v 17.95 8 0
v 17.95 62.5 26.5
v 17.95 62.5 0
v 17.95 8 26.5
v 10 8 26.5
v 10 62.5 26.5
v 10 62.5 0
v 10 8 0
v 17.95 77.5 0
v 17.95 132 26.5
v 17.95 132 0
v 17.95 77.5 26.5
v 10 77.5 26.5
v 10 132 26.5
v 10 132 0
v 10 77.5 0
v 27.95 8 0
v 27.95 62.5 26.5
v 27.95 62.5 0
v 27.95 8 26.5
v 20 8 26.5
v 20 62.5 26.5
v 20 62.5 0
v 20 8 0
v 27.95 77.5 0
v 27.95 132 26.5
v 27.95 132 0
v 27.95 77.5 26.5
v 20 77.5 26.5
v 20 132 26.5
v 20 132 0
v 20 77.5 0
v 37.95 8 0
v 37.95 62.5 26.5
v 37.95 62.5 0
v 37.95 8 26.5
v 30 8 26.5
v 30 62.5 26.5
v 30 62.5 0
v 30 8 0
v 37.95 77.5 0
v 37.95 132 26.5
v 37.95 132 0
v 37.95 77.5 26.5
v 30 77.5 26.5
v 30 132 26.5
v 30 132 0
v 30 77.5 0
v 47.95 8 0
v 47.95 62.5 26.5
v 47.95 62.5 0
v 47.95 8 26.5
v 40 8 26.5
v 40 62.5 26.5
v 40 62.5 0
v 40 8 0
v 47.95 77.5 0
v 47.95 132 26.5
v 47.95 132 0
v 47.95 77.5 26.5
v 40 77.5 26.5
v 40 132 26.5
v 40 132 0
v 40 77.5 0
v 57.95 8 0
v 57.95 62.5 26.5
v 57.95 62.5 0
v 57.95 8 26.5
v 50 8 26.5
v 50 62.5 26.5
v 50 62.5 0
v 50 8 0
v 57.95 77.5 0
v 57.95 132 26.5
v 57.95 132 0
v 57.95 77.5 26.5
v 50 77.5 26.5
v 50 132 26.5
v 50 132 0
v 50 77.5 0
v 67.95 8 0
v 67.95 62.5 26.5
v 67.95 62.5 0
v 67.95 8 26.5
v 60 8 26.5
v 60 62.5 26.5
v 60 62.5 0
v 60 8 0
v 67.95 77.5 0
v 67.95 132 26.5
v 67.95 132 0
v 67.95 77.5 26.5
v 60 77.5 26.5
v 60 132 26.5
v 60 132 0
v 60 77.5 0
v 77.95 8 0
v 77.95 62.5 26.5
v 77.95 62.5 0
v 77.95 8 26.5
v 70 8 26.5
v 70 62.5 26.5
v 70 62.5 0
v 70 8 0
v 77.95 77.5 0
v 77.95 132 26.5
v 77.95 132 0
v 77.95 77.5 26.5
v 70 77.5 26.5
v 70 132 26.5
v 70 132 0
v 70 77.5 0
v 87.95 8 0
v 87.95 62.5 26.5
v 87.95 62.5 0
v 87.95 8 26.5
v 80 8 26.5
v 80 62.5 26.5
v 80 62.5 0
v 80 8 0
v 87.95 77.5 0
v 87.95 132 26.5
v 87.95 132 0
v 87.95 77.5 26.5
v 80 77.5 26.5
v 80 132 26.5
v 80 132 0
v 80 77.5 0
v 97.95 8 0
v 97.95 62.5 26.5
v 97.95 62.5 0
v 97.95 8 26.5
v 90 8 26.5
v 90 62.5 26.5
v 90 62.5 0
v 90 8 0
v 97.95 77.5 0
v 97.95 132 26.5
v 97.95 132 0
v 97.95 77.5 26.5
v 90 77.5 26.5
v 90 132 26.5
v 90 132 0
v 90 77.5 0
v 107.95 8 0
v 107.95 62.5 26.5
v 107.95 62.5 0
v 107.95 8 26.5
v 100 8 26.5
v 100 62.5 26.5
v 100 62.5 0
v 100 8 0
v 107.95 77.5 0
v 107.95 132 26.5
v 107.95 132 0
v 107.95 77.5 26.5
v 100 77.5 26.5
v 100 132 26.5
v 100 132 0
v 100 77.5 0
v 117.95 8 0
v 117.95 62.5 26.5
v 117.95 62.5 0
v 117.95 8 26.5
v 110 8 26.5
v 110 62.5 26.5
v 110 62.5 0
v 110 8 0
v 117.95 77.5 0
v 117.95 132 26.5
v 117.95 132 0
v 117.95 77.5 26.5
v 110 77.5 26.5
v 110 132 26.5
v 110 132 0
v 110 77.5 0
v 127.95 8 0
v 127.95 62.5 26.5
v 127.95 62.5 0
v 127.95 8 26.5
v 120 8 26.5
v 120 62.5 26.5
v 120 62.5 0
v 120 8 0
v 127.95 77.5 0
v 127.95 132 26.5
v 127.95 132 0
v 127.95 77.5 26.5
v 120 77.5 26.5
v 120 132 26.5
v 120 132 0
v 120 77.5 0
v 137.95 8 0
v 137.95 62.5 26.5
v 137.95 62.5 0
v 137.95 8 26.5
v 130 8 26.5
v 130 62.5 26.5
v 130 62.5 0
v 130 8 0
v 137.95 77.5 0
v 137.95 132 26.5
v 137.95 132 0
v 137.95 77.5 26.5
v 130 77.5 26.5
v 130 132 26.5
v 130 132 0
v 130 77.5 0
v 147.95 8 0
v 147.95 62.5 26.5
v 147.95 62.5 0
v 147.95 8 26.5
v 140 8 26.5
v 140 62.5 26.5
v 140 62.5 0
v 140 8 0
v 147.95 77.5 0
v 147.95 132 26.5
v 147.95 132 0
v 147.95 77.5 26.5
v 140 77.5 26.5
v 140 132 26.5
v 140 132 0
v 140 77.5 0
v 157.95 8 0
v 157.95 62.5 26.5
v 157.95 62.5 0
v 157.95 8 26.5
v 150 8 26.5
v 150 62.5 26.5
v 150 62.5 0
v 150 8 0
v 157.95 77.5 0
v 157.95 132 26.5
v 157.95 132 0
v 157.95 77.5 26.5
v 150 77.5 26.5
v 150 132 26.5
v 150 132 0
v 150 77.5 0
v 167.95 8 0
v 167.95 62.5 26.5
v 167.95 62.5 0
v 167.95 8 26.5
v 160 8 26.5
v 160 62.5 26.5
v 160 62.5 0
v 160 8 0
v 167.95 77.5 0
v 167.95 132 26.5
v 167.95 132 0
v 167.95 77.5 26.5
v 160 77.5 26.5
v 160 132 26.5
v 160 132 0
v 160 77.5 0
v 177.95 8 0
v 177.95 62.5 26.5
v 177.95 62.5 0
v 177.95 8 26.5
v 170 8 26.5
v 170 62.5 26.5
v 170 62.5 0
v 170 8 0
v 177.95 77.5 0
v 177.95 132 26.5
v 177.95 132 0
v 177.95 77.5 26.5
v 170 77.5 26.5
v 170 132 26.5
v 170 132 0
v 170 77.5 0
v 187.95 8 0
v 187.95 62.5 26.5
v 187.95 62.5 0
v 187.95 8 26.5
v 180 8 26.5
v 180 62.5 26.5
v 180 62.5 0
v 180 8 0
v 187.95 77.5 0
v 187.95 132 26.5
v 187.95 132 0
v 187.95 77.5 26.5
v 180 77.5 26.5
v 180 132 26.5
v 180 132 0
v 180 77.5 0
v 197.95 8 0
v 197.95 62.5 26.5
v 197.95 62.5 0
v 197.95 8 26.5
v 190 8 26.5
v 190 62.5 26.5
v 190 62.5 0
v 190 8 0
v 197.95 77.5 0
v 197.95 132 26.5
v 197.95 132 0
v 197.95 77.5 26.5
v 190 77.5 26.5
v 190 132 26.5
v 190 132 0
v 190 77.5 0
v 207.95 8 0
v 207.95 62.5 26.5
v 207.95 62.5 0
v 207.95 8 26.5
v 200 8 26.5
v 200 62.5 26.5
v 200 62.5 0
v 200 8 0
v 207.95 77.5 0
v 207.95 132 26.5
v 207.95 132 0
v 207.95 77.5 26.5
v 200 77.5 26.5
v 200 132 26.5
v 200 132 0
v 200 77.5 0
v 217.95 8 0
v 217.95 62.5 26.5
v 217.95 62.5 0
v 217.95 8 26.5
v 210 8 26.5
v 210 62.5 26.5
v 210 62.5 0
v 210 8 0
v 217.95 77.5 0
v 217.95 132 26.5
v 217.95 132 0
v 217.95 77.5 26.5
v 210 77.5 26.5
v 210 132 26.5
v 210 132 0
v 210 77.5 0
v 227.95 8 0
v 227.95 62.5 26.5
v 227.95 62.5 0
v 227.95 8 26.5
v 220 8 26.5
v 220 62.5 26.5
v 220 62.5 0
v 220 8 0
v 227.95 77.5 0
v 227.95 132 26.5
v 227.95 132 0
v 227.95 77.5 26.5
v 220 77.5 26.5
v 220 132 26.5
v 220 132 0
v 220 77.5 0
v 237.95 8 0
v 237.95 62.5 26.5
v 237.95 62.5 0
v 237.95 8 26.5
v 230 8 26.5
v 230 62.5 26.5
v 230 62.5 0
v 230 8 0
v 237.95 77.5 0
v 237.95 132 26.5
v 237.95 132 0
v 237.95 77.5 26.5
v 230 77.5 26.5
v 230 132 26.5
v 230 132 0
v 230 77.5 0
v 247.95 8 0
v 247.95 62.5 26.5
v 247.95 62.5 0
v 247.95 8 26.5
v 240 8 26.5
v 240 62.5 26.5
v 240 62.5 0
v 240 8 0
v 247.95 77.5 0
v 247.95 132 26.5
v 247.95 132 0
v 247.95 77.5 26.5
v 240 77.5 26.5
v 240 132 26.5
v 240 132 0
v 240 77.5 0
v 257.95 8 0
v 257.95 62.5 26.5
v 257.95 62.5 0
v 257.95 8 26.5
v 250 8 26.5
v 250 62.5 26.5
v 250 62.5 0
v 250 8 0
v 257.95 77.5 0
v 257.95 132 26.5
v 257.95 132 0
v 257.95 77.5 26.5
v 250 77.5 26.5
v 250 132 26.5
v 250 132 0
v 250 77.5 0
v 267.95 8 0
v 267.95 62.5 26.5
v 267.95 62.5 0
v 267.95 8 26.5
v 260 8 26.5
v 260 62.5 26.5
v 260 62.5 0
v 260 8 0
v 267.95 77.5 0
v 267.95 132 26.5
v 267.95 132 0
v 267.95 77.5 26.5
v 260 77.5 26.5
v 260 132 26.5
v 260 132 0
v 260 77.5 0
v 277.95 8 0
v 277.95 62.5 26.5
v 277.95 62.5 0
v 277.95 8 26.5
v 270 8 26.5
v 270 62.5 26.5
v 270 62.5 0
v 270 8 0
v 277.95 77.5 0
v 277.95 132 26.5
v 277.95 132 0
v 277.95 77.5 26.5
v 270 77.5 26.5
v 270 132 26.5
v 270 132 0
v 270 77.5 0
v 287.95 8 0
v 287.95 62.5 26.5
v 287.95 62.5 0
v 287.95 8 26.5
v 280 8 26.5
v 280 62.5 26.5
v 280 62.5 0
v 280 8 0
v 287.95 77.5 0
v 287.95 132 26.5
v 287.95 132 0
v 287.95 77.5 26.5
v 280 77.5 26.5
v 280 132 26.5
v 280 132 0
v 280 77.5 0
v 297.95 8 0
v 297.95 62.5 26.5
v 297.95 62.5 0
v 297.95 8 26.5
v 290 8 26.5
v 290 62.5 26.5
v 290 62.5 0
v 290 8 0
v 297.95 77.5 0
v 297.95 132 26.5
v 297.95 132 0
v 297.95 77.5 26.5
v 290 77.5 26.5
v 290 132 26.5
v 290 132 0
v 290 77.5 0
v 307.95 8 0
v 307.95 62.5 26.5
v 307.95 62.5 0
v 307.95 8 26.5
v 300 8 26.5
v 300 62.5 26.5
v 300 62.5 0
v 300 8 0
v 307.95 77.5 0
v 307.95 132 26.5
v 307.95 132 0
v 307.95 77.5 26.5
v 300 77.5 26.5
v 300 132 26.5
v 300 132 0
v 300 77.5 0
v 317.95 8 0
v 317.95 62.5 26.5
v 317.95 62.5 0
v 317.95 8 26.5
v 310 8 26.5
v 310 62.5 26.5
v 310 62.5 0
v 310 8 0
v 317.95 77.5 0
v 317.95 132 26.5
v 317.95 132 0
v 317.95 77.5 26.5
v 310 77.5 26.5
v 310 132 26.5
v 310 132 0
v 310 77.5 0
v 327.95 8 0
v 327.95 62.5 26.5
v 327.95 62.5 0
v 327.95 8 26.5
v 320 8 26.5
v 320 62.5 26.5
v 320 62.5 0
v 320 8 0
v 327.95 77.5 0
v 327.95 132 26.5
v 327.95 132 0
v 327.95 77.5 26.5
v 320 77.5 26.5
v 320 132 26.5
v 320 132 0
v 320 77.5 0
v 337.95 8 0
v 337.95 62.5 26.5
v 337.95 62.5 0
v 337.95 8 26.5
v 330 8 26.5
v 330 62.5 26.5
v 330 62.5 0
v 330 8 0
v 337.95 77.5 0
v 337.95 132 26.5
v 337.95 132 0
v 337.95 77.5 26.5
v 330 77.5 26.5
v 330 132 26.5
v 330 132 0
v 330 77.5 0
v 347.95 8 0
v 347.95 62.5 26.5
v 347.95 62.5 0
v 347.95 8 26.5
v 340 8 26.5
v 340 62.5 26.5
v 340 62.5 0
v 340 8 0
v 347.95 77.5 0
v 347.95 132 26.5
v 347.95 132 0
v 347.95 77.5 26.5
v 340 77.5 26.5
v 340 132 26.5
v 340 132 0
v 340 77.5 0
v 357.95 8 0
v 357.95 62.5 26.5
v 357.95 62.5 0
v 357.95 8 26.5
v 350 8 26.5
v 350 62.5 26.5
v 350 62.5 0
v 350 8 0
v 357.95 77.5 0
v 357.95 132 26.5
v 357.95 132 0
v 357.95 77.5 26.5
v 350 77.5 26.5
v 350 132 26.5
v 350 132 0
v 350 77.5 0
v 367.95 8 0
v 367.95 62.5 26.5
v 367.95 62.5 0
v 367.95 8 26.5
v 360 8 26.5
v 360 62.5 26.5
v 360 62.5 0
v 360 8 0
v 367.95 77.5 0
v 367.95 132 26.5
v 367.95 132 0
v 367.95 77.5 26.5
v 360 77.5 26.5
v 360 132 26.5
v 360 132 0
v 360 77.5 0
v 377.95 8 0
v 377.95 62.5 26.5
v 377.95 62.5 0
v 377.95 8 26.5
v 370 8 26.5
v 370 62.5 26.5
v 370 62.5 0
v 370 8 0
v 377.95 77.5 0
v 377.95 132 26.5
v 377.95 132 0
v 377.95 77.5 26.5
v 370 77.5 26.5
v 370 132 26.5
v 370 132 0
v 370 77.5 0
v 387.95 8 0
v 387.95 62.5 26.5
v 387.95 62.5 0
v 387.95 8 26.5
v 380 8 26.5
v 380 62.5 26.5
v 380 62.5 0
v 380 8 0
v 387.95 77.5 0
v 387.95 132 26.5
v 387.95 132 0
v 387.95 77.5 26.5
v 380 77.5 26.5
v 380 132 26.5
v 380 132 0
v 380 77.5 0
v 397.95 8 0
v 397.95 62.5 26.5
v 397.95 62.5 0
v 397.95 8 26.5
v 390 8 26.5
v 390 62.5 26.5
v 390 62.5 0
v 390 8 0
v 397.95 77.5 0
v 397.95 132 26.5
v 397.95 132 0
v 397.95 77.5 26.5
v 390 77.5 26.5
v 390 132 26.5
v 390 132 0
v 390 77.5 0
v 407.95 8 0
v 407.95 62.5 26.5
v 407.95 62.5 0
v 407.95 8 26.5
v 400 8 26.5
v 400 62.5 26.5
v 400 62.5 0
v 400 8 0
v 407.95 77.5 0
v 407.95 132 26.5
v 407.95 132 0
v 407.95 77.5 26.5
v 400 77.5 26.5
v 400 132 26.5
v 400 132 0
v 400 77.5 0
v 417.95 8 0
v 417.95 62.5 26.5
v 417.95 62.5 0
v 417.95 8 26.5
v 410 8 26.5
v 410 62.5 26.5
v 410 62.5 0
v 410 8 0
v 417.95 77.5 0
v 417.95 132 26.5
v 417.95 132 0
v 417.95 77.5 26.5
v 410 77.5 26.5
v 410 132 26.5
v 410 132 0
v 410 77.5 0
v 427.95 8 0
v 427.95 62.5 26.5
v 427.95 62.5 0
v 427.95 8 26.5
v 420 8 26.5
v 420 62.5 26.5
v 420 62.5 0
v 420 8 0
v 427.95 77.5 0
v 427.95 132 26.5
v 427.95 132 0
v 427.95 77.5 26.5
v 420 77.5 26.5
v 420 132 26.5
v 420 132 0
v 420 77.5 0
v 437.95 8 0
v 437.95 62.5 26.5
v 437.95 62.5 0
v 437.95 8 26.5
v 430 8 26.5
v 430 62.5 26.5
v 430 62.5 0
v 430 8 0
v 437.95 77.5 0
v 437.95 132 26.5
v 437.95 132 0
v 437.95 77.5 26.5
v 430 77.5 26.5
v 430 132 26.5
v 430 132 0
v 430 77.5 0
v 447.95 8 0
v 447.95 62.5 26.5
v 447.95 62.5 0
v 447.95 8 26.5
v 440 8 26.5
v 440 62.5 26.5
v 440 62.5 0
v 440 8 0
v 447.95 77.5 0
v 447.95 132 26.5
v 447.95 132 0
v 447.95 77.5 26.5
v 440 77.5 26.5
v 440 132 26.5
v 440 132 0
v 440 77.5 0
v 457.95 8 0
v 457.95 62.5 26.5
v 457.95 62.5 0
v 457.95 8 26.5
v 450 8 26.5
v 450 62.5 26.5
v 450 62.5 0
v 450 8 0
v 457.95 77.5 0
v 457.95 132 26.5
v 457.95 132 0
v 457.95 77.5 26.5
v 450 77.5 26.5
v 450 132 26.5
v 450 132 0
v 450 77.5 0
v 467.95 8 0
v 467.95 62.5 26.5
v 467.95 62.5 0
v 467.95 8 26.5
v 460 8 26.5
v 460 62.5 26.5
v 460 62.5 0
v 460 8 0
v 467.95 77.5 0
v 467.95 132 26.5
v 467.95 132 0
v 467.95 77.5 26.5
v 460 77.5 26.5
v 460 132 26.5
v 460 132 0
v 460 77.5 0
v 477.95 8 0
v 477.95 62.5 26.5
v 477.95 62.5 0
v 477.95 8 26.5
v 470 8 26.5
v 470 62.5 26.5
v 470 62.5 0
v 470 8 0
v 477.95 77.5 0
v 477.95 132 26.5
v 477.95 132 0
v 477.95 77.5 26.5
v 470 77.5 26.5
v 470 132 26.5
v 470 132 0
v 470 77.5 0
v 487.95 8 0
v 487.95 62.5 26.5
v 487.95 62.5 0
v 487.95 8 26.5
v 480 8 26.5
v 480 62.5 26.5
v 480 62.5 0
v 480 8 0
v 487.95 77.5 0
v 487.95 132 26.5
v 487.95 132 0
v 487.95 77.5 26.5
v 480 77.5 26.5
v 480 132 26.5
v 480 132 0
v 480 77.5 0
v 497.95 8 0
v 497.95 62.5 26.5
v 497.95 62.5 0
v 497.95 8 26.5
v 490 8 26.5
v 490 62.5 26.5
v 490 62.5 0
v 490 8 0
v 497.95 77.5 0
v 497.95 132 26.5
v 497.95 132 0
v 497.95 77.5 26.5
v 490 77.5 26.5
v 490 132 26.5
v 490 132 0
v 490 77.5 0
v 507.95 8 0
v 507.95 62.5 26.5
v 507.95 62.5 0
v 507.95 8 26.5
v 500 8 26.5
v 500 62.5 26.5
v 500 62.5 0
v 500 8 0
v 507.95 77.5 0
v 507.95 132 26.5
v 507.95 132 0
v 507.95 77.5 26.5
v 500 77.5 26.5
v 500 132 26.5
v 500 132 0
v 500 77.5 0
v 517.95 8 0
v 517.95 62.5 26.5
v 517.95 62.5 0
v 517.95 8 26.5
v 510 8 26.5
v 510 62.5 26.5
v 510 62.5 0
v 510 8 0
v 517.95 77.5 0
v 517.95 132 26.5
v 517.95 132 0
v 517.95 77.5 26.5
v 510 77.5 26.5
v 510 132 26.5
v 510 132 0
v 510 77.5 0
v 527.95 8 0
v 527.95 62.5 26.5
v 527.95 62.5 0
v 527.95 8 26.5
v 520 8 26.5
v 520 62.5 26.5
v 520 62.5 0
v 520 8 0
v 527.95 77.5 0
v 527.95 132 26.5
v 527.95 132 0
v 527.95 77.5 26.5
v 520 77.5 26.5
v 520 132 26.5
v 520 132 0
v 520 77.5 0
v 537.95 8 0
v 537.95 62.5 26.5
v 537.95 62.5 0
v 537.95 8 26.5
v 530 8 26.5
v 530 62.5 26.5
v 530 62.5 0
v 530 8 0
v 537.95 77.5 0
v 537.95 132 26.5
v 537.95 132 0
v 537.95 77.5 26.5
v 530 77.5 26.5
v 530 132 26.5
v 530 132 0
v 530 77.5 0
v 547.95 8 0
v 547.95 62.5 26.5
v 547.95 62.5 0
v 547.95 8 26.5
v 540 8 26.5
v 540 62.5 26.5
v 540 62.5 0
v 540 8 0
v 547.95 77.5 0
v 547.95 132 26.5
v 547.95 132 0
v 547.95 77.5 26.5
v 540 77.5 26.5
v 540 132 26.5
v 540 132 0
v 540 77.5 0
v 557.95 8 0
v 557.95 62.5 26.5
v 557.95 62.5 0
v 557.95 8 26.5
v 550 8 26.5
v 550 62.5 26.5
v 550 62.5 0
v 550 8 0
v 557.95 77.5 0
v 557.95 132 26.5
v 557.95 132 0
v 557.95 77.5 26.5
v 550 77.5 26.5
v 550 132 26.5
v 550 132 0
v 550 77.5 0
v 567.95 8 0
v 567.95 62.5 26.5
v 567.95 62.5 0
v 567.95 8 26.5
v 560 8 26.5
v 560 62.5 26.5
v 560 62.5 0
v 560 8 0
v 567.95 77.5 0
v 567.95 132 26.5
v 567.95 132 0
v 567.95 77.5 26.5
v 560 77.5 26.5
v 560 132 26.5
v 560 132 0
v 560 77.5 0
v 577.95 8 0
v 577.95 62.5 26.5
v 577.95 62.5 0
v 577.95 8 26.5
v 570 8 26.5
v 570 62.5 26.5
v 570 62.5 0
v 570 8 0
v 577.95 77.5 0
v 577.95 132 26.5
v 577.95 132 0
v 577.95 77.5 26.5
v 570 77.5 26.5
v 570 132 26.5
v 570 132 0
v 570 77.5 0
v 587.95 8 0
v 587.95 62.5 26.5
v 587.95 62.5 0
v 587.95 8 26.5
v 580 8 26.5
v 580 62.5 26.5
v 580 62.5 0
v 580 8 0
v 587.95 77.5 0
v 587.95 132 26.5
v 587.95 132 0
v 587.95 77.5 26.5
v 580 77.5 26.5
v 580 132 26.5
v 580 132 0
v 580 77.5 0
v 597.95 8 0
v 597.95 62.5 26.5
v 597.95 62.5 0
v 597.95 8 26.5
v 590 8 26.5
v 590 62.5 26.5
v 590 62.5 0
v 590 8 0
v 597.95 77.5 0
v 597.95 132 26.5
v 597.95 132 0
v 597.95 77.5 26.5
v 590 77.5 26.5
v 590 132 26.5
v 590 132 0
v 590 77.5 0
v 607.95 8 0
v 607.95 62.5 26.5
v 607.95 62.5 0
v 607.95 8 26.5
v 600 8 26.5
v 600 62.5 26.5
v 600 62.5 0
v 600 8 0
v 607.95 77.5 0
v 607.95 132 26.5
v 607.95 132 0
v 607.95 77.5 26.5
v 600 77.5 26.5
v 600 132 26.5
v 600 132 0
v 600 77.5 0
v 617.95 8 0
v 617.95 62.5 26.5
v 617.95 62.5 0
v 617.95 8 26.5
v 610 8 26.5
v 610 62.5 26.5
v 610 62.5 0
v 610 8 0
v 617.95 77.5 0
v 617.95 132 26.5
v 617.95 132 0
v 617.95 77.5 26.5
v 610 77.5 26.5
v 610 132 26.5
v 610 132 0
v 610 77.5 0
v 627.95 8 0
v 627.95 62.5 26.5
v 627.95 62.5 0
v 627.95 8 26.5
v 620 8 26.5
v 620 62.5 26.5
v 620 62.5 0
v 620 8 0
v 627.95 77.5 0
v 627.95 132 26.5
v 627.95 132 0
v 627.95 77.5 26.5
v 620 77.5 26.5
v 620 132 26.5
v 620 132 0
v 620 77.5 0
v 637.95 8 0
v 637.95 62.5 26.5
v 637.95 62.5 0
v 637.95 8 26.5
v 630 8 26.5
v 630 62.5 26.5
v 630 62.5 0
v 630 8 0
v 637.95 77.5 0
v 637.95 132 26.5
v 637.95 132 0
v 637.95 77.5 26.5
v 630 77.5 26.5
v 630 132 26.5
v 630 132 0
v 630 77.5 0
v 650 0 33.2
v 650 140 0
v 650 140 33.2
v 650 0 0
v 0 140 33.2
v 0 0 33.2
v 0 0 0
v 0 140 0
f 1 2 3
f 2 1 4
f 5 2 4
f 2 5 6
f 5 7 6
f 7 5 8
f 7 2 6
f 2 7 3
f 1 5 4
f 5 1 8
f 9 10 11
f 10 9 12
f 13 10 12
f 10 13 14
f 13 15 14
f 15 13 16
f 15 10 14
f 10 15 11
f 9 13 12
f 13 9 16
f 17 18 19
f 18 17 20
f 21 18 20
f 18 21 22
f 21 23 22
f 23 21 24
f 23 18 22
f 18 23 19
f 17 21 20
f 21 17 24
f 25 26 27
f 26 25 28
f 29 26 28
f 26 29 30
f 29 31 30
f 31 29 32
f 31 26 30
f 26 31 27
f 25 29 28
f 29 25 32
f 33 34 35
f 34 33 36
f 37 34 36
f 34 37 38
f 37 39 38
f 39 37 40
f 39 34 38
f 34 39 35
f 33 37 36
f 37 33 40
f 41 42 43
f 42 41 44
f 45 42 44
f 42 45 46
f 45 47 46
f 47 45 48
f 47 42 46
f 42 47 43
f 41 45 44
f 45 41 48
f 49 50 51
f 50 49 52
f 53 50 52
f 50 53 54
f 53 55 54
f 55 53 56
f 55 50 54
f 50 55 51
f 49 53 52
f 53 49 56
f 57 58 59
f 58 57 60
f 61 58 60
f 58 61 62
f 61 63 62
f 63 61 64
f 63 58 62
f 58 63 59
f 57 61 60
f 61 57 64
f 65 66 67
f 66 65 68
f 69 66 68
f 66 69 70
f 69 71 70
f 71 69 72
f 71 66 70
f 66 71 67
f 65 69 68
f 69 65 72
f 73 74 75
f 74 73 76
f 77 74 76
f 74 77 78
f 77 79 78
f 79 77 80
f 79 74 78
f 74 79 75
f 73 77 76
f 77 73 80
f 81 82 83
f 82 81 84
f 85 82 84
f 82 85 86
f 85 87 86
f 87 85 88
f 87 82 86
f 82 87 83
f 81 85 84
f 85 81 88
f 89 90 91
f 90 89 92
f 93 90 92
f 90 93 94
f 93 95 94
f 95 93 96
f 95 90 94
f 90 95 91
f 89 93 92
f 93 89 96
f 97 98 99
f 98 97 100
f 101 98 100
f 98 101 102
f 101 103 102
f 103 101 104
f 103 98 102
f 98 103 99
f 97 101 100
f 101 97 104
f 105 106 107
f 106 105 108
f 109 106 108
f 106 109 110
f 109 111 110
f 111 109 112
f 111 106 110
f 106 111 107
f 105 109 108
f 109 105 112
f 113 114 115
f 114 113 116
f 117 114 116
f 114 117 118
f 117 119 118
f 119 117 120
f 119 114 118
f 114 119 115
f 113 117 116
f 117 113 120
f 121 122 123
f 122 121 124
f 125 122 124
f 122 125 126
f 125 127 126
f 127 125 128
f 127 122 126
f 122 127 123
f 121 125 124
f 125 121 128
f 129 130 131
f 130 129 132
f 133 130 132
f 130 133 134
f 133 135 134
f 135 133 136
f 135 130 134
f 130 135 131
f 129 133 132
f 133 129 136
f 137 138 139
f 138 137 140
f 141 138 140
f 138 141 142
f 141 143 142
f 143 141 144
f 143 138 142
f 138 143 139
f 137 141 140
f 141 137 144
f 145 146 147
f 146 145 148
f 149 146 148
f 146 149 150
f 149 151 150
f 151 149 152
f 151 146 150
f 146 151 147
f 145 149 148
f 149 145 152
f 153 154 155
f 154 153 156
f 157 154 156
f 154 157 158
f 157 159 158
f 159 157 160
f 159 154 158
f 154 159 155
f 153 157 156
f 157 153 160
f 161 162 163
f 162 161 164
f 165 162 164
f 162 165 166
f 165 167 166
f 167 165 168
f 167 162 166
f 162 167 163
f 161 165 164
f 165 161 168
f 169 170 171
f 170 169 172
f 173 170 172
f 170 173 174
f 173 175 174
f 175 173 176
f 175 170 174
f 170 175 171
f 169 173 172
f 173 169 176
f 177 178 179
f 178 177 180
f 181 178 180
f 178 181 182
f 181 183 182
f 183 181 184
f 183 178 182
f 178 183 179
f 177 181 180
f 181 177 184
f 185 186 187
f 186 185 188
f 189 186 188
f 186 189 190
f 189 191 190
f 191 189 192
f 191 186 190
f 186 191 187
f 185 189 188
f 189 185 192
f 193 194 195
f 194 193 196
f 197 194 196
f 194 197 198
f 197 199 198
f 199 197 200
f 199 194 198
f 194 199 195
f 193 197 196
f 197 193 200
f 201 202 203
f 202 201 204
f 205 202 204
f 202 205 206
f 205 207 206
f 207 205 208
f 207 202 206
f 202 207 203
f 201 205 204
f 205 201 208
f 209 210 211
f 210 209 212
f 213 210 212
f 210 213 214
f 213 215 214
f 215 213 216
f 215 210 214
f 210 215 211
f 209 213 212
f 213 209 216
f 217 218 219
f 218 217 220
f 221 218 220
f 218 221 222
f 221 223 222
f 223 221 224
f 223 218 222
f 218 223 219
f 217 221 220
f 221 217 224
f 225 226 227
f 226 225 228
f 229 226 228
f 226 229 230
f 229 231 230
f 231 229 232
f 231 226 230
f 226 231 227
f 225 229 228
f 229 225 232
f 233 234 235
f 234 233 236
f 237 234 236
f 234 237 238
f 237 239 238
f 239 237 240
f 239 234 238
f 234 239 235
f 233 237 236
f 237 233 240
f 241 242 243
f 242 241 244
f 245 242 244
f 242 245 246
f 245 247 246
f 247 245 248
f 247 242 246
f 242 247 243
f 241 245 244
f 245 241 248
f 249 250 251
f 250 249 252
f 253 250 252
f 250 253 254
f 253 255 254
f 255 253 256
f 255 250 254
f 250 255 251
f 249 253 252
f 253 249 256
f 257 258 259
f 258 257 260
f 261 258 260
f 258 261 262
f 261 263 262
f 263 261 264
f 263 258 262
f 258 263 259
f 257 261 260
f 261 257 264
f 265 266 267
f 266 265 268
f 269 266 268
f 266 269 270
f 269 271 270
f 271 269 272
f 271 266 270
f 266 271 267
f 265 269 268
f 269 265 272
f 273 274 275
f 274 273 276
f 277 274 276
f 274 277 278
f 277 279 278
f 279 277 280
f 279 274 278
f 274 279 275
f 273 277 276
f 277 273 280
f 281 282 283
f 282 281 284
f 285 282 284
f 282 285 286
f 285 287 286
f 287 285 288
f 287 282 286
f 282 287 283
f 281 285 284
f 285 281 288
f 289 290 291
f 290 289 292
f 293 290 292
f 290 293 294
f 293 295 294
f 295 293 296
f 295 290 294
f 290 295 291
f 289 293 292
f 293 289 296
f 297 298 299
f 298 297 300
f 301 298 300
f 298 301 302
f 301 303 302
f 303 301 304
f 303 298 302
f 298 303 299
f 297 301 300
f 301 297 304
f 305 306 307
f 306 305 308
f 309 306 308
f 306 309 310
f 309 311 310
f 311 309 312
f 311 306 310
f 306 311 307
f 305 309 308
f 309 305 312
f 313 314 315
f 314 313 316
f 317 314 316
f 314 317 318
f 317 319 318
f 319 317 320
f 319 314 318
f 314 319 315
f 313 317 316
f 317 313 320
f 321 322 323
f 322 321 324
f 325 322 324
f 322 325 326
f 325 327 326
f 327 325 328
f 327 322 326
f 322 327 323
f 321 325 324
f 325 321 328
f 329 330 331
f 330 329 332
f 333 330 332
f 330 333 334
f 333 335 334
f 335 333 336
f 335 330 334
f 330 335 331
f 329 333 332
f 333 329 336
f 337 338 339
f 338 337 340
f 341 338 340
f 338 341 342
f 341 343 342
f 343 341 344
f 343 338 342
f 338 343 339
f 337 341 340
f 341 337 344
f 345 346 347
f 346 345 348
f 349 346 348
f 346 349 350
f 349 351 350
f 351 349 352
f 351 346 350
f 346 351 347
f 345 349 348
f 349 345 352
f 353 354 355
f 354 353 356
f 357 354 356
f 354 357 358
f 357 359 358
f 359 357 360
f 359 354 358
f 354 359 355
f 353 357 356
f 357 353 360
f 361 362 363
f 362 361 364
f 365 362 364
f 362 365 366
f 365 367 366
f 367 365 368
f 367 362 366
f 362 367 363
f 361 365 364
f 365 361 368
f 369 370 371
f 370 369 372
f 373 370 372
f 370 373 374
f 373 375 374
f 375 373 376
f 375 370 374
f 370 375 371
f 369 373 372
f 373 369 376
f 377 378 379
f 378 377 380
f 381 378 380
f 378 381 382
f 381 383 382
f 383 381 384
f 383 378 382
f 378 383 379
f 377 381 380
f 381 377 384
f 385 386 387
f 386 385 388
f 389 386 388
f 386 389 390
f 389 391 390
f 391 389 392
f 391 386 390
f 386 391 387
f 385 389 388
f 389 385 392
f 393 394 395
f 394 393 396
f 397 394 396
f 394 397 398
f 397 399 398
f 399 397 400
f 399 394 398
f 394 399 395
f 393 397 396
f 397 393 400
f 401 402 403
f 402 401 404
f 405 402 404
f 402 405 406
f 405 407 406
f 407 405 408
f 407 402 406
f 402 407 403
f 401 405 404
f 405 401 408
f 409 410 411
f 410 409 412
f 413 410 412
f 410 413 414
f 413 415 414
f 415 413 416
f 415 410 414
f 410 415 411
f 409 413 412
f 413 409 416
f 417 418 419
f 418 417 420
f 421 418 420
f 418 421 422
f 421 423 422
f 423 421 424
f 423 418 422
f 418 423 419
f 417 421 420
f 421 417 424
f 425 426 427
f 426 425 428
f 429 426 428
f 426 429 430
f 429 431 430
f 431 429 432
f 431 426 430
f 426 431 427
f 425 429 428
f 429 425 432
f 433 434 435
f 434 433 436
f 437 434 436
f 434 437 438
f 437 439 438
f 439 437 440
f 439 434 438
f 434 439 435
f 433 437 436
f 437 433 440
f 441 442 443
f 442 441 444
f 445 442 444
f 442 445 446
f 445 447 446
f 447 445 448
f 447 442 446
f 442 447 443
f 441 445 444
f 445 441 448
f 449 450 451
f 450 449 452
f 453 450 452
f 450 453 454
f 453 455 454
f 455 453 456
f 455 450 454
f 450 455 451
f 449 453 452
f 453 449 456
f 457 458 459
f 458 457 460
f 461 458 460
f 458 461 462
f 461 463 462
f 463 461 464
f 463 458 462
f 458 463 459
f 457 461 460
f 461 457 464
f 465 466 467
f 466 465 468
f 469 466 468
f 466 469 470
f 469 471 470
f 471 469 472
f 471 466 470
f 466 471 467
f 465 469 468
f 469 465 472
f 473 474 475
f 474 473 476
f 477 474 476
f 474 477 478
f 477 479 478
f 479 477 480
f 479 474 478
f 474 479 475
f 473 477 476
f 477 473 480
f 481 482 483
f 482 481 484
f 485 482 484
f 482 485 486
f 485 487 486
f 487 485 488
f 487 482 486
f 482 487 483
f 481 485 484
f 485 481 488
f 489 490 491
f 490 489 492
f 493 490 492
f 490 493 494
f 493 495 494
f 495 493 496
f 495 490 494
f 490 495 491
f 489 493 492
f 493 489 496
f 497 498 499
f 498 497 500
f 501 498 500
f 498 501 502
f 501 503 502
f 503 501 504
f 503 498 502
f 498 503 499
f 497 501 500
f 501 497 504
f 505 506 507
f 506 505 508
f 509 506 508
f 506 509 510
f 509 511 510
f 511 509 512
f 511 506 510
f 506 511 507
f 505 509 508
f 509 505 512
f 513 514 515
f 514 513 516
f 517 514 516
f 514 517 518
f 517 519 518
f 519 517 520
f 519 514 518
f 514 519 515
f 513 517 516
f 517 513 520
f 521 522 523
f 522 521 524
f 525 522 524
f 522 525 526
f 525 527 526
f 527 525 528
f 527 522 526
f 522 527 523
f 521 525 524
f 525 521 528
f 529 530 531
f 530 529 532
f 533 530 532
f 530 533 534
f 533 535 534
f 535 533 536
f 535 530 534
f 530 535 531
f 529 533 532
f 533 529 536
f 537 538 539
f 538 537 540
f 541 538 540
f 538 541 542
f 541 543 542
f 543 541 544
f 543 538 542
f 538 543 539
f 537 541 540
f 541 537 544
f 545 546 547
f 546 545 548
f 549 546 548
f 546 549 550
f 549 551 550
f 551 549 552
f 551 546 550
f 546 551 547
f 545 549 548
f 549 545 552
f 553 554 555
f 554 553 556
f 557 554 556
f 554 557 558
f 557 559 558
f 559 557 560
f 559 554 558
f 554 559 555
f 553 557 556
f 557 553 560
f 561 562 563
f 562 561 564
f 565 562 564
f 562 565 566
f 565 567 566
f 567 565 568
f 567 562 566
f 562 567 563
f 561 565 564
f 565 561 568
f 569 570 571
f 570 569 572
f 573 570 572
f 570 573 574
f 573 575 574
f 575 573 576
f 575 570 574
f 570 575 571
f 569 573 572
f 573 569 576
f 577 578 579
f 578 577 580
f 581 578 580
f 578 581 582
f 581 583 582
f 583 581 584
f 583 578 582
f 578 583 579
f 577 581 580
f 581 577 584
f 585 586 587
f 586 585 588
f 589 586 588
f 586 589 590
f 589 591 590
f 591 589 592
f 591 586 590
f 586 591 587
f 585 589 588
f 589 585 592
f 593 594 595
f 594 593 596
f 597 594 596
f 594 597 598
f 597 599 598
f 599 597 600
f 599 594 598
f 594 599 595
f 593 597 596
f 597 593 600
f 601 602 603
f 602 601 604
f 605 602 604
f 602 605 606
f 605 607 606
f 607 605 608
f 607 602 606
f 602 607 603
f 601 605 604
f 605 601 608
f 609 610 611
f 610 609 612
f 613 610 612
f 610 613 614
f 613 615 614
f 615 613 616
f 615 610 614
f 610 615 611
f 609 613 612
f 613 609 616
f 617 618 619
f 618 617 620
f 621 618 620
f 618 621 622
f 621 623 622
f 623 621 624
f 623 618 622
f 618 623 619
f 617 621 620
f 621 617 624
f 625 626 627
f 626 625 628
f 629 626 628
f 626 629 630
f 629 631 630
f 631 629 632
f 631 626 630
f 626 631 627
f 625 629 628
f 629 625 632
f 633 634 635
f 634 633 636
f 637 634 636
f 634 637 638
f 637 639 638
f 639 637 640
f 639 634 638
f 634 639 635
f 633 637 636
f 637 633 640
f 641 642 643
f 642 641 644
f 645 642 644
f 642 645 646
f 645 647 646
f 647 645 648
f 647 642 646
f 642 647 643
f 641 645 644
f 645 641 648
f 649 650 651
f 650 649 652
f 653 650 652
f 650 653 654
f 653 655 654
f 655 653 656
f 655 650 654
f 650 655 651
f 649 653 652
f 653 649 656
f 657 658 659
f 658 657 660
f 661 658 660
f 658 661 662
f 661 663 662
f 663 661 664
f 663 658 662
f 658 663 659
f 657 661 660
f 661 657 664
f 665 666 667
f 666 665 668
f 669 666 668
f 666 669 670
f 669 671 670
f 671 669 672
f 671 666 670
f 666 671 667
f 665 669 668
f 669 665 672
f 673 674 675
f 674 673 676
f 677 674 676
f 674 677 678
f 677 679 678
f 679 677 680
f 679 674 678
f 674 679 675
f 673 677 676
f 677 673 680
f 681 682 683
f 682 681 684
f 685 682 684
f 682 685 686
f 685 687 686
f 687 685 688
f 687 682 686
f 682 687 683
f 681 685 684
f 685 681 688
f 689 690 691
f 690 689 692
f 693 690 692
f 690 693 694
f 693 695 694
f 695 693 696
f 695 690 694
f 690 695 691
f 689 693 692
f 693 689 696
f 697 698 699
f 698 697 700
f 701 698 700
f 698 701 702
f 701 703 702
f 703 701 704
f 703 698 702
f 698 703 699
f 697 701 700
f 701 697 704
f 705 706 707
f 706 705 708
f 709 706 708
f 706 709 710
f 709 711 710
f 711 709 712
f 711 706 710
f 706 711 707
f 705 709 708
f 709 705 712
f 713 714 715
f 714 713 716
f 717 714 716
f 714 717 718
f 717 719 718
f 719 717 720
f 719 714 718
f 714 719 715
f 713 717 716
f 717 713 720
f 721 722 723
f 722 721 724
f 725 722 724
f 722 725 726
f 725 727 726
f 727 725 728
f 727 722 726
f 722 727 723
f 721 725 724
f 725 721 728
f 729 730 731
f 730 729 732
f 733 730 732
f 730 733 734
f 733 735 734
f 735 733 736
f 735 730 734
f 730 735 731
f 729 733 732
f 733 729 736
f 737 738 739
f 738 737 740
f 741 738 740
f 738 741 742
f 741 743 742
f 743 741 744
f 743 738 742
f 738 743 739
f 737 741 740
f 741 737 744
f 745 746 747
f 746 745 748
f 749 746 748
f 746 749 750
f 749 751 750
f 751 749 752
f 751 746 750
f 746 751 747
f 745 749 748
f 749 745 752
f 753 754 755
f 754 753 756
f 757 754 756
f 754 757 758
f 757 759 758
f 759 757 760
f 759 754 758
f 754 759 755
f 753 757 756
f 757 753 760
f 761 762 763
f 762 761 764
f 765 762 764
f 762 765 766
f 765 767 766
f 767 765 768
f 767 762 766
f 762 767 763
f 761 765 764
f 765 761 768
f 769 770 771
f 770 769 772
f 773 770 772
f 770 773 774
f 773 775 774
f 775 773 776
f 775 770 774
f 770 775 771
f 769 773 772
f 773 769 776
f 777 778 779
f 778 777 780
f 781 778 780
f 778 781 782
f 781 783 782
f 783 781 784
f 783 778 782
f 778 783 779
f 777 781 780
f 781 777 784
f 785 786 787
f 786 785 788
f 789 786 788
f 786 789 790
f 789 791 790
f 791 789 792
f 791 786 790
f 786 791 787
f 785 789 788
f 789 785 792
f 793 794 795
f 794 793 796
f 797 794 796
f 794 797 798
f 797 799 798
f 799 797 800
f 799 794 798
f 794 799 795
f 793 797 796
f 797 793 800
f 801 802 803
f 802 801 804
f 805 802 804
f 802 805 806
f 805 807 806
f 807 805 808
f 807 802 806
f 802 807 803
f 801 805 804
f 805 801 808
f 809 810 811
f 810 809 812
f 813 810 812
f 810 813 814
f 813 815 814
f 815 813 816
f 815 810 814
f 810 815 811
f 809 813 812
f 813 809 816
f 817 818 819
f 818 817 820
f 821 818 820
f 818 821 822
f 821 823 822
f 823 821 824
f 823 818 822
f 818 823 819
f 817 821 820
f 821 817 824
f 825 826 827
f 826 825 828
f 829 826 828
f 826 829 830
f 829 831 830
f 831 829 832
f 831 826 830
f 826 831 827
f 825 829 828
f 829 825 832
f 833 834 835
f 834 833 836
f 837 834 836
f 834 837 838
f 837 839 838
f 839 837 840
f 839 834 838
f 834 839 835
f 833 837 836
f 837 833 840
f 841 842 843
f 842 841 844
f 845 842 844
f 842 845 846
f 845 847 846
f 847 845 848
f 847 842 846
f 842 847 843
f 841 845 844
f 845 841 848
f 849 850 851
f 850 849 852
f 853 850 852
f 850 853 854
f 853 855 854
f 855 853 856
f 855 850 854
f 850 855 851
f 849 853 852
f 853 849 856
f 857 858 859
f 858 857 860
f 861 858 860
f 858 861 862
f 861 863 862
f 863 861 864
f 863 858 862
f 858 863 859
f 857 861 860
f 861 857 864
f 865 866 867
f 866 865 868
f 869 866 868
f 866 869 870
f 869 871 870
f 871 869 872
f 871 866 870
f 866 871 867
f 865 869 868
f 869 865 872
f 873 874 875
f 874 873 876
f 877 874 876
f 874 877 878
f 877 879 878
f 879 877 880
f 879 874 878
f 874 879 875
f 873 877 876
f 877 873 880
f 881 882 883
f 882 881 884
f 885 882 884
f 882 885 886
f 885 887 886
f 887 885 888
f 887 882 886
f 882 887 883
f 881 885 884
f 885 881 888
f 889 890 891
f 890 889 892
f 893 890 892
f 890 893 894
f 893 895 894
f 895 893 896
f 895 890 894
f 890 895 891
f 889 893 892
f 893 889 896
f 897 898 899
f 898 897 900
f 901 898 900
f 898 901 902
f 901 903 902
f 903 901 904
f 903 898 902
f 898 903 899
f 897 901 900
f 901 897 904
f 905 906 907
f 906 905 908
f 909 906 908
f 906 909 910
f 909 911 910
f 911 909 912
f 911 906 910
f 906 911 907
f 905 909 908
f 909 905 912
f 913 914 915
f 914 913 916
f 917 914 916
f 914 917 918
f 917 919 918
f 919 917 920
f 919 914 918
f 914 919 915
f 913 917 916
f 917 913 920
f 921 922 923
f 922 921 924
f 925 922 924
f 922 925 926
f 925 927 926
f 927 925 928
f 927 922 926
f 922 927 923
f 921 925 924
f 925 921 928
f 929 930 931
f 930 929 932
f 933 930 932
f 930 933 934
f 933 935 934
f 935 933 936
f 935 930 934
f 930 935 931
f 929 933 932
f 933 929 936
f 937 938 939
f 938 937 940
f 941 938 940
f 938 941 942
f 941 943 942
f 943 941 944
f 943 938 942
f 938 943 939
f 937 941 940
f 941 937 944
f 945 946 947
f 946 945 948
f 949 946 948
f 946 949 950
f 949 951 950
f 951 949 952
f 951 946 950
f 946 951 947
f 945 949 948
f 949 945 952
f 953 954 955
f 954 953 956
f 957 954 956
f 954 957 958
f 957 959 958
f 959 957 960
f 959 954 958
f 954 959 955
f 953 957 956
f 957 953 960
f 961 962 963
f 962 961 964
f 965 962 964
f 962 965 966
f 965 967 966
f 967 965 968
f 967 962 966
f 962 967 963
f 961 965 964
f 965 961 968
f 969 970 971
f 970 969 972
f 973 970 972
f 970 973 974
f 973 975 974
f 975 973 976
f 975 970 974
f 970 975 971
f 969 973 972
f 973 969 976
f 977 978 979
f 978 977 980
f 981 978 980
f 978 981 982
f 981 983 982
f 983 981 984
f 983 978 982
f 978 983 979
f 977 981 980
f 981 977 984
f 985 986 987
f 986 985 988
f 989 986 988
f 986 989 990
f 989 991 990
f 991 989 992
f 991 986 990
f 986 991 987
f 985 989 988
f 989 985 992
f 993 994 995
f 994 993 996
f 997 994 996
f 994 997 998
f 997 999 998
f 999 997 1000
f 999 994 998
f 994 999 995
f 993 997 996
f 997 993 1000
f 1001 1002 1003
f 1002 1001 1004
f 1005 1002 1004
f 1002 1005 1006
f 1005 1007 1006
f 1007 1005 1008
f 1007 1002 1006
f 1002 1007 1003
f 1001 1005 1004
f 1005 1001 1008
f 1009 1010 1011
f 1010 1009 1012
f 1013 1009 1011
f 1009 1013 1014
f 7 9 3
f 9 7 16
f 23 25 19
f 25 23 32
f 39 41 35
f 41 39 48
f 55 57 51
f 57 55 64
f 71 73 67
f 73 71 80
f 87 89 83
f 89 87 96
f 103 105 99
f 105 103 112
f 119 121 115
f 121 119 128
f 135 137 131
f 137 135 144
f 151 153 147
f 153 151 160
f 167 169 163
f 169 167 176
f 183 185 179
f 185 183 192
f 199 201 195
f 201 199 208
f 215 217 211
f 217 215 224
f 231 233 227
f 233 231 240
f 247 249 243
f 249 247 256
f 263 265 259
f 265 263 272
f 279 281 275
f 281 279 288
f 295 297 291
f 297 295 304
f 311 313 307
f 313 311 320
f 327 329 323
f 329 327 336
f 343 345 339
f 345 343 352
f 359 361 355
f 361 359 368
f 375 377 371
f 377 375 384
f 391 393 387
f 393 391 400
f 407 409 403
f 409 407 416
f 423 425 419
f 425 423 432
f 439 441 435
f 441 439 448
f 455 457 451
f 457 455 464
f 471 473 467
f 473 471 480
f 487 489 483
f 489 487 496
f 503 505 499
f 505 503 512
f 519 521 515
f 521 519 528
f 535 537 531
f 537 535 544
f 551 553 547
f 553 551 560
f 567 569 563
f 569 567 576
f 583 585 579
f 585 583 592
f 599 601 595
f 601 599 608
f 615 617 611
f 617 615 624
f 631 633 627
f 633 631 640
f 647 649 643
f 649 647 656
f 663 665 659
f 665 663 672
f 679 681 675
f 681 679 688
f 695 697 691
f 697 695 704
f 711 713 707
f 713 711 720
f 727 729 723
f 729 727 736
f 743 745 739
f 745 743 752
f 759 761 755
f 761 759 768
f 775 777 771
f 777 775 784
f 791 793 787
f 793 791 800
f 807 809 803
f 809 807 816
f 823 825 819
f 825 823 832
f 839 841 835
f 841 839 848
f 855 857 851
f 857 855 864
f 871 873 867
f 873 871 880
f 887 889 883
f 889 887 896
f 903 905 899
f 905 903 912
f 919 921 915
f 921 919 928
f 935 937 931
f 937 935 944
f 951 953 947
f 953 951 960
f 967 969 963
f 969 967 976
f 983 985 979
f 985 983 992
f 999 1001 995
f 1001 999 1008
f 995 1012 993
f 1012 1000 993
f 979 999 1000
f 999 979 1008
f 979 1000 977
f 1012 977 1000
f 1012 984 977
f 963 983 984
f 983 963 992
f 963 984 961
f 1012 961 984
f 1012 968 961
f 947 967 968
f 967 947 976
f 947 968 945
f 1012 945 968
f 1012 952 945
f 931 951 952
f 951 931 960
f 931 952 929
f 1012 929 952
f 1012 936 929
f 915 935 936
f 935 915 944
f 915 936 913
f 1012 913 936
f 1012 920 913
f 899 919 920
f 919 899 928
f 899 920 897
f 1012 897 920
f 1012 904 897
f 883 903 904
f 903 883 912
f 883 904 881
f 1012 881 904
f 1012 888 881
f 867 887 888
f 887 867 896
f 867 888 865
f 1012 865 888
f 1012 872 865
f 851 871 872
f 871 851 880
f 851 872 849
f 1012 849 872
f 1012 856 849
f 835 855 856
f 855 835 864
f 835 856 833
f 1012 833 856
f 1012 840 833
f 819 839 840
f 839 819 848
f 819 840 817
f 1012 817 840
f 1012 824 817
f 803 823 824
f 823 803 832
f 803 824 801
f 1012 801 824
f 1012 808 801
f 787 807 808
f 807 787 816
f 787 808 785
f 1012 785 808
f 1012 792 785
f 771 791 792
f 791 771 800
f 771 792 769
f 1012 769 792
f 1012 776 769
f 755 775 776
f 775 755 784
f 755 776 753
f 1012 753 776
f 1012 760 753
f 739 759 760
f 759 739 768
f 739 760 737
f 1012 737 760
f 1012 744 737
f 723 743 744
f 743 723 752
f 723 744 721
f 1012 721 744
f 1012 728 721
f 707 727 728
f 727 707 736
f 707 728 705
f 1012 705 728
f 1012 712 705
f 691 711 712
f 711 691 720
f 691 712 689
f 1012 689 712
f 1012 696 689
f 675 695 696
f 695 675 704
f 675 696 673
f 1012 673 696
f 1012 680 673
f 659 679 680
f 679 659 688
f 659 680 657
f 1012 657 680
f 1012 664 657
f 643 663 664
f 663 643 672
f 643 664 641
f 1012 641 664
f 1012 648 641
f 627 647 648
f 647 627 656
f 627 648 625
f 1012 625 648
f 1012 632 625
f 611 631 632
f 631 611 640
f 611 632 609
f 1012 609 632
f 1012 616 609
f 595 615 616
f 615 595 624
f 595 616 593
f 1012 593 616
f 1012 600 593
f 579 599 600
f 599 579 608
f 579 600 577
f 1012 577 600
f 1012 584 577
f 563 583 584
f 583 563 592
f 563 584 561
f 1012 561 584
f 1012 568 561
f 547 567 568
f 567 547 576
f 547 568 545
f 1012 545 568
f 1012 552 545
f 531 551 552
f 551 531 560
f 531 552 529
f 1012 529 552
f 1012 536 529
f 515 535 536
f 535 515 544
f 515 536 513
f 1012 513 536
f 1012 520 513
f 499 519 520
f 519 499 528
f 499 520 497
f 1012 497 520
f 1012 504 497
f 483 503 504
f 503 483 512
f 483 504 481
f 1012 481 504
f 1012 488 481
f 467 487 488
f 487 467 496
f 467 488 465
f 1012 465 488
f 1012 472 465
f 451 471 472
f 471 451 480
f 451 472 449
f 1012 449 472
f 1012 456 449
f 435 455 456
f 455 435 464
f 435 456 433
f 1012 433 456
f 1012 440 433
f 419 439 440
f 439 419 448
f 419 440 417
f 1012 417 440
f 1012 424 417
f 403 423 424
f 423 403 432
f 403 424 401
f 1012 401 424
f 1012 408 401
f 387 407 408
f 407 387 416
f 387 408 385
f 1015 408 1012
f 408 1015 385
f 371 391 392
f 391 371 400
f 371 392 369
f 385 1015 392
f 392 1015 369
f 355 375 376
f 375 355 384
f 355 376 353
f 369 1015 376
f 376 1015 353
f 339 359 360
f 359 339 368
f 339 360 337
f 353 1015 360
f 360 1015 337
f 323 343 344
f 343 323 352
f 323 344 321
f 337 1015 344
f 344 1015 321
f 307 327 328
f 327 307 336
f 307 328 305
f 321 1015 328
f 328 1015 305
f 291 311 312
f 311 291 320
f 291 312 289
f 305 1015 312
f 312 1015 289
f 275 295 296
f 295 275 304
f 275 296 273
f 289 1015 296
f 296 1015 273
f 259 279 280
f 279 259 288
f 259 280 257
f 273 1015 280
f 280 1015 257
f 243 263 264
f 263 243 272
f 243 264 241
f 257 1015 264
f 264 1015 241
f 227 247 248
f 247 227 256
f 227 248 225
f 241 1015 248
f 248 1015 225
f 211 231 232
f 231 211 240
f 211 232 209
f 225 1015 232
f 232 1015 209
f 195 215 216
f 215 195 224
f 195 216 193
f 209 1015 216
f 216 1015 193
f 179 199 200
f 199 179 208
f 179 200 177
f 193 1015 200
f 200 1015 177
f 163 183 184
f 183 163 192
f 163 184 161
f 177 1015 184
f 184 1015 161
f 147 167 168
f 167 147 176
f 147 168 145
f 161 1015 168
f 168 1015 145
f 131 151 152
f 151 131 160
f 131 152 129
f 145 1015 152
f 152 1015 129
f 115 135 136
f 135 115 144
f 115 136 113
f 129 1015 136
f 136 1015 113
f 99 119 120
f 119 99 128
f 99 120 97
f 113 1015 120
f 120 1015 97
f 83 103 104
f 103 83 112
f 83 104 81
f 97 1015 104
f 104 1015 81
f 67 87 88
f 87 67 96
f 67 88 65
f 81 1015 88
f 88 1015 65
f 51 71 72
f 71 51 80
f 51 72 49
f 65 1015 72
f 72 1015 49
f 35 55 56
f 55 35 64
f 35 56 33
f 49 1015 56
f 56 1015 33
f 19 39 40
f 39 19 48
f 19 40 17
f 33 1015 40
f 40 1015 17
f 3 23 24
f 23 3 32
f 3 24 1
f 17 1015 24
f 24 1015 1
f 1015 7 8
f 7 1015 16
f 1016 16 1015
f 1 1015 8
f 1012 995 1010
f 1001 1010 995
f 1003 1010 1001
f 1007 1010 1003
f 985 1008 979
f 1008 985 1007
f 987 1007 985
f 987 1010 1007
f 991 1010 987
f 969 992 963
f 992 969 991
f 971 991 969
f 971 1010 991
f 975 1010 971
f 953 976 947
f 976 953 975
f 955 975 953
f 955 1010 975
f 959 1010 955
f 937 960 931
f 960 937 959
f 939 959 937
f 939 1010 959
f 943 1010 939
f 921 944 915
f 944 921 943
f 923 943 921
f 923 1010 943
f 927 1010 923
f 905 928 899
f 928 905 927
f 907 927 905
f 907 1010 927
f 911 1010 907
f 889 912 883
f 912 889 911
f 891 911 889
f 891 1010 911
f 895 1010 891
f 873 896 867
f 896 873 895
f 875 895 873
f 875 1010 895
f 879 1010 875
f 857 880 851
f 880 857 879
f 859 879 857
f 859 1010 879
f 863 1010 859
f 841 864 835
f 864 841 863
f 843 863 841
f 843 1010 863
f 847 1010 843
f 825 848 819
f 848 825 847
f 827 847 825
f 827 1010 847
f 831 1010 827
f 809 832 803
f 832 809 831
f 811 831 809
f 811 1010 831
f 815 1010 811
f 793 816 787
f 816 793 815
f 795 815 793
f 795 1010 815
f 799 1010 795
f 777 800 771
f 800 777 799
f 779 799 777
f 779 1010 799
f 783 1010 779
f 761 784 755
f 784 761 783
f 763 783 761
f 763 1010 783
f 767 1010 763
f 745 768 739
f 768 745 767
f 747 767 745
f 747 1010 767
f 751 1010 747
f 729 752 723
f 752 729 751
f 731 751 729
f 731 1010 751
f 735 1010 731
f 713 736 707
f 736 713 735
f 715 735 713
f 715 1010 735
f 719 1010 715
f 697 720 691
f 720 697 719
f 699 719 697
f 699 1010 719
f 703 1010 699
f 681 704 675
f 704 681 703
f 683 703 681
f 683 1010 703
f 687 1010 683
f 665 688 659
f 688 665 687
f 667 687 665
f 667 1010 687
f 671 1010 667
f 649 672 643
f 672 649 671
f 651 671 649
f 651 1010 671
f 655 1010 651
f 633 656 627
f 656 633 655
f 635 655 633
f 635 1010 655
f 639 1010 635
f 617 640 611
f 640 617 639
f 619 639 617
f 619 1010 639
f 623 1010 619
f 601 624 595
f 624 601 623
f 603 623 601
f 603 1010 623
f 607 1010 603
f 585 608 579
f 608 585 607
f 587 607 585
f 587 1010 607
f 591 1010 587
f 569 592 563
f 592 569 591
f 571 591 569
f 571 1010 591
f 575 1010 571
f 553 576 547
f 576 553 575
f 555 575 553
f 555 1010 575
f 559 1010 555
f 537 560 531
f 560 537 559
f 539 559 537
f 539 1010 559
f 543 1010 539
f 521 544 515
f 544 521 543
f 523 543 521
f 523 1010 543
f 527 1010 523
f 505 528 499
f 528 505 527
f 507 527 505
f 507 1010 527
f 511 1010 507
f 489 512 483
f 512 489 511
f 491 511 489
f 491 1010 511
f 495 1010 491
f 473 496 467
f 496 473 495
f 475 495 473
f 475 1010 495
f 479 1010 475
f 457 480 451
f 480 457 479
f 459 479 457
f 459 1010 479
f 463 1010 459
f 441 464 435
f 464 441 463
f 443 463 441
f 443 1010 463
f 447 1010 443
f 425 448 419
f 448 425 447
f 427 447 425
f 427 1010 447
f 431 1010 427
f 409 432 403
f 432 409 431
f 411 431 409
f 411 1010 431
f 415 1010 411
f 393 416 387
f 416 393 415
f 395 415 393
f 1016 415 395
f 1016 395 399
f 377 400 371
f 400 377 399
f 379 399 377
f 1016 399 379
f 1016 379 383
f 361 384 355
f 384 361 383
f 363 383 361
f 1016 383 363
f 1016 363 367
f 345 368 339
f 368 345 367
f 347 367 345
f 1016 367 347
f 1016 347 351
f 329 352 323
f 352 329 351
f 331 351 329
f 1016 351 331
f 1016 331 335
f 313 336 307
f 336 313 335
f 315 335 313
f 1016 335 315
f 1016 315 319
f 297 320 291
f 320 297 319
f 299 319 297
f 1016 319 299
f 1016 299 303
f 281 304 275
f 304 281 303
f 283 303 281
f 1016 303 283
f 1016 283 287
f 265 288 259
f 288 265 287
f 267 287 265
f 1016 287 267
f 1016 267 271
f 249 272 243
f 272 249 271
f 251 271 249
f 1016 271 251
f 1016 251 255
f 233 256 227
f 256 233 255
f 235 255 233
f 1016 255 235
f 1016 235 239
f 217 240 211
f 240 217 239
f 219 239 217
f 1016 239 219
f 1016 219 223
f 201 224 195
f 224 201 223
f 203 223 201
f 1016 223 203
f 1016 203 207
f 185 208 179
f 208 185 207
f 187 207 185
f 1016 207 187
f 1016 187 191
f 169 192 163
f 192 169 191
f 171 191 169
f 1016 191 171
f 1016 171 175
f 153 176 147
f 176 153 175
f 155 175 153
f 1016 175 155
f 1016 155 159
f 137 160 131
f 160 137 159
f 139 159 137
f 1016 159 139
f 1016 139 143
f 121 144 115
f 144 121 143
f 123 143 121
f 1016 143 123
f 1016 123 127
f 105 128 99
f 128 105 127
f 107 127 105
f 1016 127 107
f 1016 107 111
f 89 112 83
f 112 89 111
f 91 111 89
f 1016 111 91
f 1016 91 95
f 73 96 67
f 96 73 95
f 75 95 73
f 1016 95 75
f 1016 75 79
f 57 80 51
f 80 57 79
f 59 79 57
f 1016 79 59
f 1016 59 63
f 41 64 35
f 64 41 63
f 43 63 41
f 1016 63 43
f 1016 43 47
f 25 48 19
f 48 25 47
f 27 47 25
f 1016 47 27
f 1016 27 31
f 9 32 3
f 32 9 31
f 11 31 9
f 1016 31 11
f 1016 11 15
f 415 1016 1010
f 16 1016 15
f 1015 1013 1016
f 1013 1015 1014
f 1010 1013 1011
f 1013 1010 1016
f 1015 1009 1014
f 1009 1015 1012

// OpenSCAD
difference(){
cube([650,140,33.2]);
for(z=[1:63]){
translate([10*z,8,-.1])
cube([7.95,54.5,26.6]);
translate([10*z,77.5,-.1])
cube([7.95,54.5,26.6]);
}
}
